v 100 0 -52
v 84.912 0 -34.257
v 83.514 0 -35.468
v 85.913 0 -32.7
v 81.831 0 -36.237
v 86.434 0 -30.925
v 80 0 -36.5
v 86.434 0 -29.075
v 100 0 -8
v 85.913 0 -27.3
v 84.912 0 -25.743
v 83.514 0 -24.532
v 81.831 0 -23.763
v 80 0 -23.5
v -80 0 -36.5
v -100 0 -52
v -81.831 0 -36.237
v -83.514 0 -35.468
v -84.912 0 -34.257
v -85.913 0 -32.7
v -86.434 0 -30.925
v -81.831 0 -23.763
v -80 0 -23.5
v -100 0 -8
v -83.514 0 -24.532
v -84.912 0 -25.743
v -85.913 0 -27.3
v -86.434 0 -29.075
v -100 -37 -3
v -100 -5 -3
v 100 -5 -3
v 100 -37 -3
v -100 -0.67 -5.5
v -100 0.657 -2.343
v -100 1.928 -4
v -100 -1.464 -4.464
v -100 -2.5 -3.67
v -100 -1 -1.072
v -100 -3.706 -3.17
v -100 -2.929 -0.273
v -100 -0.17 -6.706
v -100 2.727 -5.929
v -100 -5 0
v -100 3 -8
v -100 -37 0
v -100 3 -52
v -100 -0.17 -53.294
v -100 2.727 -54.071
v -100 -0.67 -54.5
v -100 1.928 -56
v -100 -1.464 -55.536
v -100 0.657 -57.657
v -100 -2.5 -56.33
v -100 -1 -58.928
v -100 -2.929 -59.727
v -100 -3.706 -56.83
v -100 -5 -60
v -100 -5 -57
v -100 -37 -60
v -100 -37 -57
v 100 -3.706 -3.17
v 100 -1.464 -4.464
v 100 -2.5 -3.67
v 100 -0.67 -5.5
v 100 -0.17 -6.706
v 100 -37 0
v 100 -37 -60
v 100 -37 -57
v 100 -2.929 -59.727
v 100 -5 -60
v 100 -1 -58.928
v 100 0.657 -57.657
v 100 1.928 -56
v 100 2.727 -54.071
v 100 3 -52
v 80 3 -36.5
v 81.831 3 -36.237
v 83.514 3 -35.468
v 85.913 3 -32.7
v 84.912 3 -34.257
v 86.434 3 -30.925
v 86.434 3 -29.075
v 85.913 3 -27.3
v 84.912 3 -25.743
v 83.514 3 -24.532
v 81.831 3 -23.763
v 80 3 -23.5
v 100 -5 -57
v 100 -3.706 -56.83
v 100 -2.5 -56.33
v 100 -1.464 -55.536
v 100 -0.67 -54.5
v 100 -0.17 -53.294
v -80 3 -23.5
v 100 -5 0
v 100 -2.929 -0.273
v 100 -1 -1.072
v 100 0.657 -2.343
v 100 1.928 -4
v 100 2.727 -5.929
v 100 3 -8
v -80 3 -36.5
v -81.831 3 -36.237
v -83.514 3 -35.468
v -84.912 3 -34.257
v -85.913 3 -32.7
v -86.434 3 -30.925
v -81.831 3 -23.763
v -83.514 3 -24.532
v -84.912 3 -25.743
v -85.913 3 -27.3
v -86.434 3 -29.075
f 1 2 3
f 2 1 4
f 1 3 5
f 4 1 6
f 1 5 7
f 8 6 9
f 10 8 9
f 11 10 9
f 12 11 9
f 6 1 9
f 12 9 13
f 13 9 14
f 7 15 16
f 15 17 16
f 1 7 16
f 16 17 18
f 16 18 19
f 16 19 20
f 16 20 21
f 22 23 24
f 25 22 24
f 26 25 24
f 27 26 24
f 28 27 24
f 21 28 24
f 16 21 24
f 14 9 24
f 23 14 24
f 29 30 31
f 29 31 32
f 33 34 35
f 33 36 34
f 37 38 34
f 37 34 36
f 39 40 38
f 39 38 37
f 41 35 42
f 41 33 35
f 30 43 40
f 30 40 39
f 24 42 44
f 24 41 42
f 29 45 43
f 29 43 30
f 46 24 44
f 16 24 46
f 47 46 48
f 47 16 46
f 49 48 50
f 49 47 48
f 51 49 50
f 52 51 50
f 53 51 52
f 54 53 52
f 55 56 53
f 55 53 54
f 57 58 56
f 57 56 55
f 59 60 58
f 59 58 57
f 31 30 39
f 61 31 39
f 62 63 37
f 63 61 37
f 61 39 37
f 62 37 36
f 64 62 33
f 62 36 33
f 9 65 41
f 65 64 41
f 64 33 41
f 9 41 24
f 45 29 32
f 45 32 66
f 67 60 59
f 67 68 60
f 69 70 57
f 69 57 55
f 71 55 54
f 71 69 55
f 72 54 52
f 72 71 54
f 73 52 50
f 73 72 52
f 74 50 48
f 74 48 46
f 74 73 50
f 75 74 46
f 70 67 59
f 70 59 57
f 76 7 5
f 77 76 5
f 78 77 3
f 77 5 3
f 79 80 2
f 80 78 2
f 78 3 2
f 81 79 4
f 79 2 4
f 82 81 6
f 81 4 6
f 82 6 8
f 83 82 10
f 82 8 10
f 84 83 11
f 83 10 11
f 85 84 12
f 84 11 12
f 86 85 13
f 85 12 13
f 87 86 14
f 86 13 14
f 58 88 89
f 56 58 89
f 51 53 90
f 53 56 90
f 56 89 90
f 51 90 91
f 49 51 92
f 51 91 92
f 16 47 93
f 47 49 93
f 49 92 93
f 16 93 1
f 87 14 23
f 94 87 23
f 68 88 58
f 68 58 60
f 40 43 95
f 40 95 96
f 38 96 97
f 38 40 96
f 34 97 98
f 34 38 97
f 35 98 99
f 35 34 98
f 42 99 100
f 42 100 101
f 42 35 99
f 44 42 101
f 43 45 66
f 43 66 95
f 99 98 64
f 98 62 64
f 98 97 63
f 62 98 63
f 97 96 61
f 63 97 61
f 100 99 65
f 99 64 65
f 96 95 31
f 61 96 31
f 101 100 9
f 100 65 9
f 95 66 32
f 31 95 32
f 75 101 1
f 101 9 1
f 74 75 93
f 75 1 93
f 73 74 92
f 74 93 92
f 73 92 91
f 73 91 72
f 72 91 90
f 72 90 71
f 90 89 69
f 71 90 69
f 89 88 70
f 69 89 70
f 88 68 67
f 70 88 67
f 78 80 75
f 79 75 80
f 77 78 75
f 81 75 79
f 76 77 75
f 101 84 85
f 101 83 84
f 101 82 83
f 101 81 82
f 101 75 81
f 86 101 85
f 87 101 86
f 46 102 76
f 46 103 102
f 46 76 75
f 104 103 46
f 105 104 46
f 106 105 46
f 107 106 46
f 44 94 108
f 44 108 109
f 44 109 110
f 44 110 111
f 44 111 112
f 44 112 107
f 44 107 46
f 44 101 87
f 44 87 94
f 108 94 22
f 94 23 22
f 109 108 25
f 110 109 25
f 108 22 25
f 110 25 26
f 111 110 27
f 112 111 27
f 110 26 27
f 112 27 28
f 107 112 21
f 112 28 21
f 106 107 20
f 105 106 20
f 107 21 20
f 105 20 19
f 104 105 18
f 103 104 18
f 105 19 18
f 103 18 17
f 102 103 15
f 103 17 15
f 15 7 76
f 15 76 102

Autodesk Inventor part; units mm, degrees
ref_plane "YZ Plane" through (0, 0, 0) normal (1, 0, 0) x (0, 1, 0)
ref_plane "XZ Plane" through (0, 0, 0) normal (0, 1, 0) x (-1, 0, 0)
ref_plane "XY Plane" through (0, 0, 0) normal (0, 0, 1) x (1, 0, 0)
sketch "Sketch4" plane through (0, 0, 0) normal (0, 1, 0) x (-1, 0, 0)
  line L0 (100, -60) -> (-100, -60)
  line L1 (-100, -60) -> (-100, 0)
  line L2 (-100, 0) -> (100, 0)
  line L3 (100, 0) -> (100, -60)
  point P0 (0, 0)
  point P1 (0, 0)
  dimension "d36" = 200
  dimension "d37" = 60
extrude "Plate2" add sketch "Sketch4" along normal blind 3
sketch "Sketch5" plane through (0, 0, 0) normal (0, -1, 0) x (1, 0, 0)
  circle A0 centre (-80, -30) radius 6.5
  circle A1 centre (80, -30) radius 6.5
  line L0 (0, 0) -> (0, -60) construction
  line L1 (100, -60) -> (-100, -60) construction
  line L2 (100, 0) -> (-100, 0) projected
  line L3 (80, -23.5) -> (-80, -23.5)
  line L4 (80, -36.5) -> (-80, -36.5)
  dimension "d39" = 160
  dimension "d40" = 30
  dimension "d41" = 13
  dimension "d55" = 60
extrude "Cut1" cut sketch "Sketch5" against normal blind 3
sketch "Sketch6" plane through (-100, 3, -3) normal (0, 0, 1) x (1, 0, 0)
  line L0 (200, 0) -> (0, 0)
  line L1 (0, 0) -> (0, -40)
  line L2 (0, -40) -> (200, -40)
  line L3 (200, -40) -> (200, 0)
edge flange "Flange1" height 40 angle 90 thickness 3 bend radius 5 thickness toward (0, 0, 1) relief round relief width 3 relief depth 1.5 corner gap 5 corner form 0 edges at (0, 0, 0) (0, 0, -60) wall of the first edge with corners at (100, 3, -3) (-100, 3, -3) (-100, -37, -3) (100, -37, -3)
bend "Bend1"
corner "Corner1"
equation "\"d40\" = 0.5 * d55"
equation "\"d42\" = Thickness"
equation "\"d38\" = Thickness"
equation "\"d44\" = BendReliefWidth"
equation "\"d45\" = BendReliefDepth"
equation "\"d46\" = MinimumRemnant"
equation "\"d47\" = TransitionRadius"
equation "\"d50\" = BendRadius"
equation "\"d51\" = CornerReliefSize"
equation "\"d52\" = GapSize"
equation "\"d53\" = JacobiRadiusSize"
equation "\"BendReliefWidth\" = Thickness"
equation "\"BendReliefDepth\" = 0.5 * Thickness"
equation "\"CornerReliefSize\" = 4 * Thickness"
equation "\"MinimumRemnant\" = 2 * Thickness"
equation "\"TransitionRadius\" = BendRadius"
equation "\"JacobiRadiusSize\" = BendRadius"
equation "\"GapSize\" = Thickness"
equation "\"Thickness\" = 3"
equation "\"BendRadius\" = 5"
properties part number "NDM-VOS 715 flange" material "Stainless Steel"
